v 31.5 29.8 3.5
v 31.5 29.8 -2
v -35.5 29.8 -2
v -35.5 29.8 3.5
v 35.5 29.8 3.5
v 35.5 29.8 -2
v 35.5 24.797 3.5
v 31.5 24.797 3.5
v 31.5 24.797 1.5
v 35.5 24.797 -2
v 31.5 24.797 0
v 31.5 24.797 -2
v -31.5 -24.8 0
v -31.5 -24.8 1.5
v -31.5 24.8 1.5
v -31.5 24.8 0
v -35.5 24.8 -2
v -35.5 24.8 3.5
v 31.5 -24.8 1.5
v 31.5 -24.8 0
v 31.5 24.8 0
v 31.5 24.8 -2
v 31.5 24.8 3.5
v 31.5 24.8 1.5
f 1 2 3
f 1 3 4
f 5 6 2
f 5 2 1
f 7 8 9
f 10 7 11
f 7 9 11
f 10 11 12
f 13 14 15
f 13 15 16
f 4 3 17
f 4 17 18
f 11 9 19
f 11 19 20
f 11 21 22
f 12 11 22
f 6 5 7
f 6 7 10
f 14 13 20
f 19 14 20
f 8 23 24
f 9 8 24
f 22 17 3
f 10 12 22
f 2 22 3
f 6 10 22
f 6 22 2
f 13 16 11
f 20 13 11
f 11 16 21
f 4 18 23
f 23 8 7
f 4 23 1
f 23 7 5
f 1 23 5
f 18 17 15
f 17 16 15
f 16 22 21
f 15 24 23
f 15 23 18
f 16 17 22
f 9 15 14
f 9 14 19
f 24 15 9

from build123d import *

# Parameters (mm, degrees)
SKETCH3_W           = 63
SKETCH3_H           = 49.6
BOSS_EXTRUDE1_DEPTH = 1.5
SKETCH10_W          = 2
SKETCH10_H          = 5
SKETCH10_W_2        = 1.5
BOSS_EXTRUDE2_DEPTH = 63
SKETCH11_W          = 5.5
SKETCH11_H          = 5.002720327
BOSS_EXTRUDE3_DEPTH = 4
SKETCH12_W          = 5.5
SKETCH12_H          = 5
BOSS_EXTRUDE4_DEPTH = 4


with BuildPart() as part:
    # Sketch3 → Boss-Extrude1 (new body)
    with BuildSketch(Plane.XY):
        Rectangle(SKETCH3_W, SKETCH3_H)
    extrude(amount=BOSS_EXTRUDE1_DEPTH)

    # Sketch10 → Boss-Extrude2 (add)
    with BuildSketch(Plane(origin=(31.5, 0, 0), x_dir=(0, 0, -1), z_dir=(1, 0, 0))):
        with Locations((-2.5, 27.3)):
            Rectangle(SKETCH10_W, SKETCH10_H)
        with Locations((-0.75, 27.3)):
            Rectangle(SKETCH10_W_2, SKETCH10_H)
        with Locations((1, 27.3)):
            Rectangle(SKETCH10_W, SKETCH10_H)
    extrude(amount=-BOSS_EXTRUDE2_DEPTH)

    # Sketch11 → Boss-Extrude3 (add)
    with BuildSketch(Plane(origin=(31.5, 0, 0), x_dir=(0, 0, -1), z_dir=(1, 0, 0))):
        with Locations((-0.75, 27.298639837)):
            Rectangle(SKETCH11_W, SKETCH11_H)
    extrude(amount=BOSS_EXTRUDE3_DEPTH)

    # Sketch12 → Boss-Extrude4 (add)
    with BuildSketch(Plane.ZY.offset(31.5)):
        with Locations((0.75, 27.3)):
            Rectangle(SKETCH12_W, SKETCH12_H)
    extrude(amount=BOSS_EXTRUDE4_DEPTH)


solid = part.part
